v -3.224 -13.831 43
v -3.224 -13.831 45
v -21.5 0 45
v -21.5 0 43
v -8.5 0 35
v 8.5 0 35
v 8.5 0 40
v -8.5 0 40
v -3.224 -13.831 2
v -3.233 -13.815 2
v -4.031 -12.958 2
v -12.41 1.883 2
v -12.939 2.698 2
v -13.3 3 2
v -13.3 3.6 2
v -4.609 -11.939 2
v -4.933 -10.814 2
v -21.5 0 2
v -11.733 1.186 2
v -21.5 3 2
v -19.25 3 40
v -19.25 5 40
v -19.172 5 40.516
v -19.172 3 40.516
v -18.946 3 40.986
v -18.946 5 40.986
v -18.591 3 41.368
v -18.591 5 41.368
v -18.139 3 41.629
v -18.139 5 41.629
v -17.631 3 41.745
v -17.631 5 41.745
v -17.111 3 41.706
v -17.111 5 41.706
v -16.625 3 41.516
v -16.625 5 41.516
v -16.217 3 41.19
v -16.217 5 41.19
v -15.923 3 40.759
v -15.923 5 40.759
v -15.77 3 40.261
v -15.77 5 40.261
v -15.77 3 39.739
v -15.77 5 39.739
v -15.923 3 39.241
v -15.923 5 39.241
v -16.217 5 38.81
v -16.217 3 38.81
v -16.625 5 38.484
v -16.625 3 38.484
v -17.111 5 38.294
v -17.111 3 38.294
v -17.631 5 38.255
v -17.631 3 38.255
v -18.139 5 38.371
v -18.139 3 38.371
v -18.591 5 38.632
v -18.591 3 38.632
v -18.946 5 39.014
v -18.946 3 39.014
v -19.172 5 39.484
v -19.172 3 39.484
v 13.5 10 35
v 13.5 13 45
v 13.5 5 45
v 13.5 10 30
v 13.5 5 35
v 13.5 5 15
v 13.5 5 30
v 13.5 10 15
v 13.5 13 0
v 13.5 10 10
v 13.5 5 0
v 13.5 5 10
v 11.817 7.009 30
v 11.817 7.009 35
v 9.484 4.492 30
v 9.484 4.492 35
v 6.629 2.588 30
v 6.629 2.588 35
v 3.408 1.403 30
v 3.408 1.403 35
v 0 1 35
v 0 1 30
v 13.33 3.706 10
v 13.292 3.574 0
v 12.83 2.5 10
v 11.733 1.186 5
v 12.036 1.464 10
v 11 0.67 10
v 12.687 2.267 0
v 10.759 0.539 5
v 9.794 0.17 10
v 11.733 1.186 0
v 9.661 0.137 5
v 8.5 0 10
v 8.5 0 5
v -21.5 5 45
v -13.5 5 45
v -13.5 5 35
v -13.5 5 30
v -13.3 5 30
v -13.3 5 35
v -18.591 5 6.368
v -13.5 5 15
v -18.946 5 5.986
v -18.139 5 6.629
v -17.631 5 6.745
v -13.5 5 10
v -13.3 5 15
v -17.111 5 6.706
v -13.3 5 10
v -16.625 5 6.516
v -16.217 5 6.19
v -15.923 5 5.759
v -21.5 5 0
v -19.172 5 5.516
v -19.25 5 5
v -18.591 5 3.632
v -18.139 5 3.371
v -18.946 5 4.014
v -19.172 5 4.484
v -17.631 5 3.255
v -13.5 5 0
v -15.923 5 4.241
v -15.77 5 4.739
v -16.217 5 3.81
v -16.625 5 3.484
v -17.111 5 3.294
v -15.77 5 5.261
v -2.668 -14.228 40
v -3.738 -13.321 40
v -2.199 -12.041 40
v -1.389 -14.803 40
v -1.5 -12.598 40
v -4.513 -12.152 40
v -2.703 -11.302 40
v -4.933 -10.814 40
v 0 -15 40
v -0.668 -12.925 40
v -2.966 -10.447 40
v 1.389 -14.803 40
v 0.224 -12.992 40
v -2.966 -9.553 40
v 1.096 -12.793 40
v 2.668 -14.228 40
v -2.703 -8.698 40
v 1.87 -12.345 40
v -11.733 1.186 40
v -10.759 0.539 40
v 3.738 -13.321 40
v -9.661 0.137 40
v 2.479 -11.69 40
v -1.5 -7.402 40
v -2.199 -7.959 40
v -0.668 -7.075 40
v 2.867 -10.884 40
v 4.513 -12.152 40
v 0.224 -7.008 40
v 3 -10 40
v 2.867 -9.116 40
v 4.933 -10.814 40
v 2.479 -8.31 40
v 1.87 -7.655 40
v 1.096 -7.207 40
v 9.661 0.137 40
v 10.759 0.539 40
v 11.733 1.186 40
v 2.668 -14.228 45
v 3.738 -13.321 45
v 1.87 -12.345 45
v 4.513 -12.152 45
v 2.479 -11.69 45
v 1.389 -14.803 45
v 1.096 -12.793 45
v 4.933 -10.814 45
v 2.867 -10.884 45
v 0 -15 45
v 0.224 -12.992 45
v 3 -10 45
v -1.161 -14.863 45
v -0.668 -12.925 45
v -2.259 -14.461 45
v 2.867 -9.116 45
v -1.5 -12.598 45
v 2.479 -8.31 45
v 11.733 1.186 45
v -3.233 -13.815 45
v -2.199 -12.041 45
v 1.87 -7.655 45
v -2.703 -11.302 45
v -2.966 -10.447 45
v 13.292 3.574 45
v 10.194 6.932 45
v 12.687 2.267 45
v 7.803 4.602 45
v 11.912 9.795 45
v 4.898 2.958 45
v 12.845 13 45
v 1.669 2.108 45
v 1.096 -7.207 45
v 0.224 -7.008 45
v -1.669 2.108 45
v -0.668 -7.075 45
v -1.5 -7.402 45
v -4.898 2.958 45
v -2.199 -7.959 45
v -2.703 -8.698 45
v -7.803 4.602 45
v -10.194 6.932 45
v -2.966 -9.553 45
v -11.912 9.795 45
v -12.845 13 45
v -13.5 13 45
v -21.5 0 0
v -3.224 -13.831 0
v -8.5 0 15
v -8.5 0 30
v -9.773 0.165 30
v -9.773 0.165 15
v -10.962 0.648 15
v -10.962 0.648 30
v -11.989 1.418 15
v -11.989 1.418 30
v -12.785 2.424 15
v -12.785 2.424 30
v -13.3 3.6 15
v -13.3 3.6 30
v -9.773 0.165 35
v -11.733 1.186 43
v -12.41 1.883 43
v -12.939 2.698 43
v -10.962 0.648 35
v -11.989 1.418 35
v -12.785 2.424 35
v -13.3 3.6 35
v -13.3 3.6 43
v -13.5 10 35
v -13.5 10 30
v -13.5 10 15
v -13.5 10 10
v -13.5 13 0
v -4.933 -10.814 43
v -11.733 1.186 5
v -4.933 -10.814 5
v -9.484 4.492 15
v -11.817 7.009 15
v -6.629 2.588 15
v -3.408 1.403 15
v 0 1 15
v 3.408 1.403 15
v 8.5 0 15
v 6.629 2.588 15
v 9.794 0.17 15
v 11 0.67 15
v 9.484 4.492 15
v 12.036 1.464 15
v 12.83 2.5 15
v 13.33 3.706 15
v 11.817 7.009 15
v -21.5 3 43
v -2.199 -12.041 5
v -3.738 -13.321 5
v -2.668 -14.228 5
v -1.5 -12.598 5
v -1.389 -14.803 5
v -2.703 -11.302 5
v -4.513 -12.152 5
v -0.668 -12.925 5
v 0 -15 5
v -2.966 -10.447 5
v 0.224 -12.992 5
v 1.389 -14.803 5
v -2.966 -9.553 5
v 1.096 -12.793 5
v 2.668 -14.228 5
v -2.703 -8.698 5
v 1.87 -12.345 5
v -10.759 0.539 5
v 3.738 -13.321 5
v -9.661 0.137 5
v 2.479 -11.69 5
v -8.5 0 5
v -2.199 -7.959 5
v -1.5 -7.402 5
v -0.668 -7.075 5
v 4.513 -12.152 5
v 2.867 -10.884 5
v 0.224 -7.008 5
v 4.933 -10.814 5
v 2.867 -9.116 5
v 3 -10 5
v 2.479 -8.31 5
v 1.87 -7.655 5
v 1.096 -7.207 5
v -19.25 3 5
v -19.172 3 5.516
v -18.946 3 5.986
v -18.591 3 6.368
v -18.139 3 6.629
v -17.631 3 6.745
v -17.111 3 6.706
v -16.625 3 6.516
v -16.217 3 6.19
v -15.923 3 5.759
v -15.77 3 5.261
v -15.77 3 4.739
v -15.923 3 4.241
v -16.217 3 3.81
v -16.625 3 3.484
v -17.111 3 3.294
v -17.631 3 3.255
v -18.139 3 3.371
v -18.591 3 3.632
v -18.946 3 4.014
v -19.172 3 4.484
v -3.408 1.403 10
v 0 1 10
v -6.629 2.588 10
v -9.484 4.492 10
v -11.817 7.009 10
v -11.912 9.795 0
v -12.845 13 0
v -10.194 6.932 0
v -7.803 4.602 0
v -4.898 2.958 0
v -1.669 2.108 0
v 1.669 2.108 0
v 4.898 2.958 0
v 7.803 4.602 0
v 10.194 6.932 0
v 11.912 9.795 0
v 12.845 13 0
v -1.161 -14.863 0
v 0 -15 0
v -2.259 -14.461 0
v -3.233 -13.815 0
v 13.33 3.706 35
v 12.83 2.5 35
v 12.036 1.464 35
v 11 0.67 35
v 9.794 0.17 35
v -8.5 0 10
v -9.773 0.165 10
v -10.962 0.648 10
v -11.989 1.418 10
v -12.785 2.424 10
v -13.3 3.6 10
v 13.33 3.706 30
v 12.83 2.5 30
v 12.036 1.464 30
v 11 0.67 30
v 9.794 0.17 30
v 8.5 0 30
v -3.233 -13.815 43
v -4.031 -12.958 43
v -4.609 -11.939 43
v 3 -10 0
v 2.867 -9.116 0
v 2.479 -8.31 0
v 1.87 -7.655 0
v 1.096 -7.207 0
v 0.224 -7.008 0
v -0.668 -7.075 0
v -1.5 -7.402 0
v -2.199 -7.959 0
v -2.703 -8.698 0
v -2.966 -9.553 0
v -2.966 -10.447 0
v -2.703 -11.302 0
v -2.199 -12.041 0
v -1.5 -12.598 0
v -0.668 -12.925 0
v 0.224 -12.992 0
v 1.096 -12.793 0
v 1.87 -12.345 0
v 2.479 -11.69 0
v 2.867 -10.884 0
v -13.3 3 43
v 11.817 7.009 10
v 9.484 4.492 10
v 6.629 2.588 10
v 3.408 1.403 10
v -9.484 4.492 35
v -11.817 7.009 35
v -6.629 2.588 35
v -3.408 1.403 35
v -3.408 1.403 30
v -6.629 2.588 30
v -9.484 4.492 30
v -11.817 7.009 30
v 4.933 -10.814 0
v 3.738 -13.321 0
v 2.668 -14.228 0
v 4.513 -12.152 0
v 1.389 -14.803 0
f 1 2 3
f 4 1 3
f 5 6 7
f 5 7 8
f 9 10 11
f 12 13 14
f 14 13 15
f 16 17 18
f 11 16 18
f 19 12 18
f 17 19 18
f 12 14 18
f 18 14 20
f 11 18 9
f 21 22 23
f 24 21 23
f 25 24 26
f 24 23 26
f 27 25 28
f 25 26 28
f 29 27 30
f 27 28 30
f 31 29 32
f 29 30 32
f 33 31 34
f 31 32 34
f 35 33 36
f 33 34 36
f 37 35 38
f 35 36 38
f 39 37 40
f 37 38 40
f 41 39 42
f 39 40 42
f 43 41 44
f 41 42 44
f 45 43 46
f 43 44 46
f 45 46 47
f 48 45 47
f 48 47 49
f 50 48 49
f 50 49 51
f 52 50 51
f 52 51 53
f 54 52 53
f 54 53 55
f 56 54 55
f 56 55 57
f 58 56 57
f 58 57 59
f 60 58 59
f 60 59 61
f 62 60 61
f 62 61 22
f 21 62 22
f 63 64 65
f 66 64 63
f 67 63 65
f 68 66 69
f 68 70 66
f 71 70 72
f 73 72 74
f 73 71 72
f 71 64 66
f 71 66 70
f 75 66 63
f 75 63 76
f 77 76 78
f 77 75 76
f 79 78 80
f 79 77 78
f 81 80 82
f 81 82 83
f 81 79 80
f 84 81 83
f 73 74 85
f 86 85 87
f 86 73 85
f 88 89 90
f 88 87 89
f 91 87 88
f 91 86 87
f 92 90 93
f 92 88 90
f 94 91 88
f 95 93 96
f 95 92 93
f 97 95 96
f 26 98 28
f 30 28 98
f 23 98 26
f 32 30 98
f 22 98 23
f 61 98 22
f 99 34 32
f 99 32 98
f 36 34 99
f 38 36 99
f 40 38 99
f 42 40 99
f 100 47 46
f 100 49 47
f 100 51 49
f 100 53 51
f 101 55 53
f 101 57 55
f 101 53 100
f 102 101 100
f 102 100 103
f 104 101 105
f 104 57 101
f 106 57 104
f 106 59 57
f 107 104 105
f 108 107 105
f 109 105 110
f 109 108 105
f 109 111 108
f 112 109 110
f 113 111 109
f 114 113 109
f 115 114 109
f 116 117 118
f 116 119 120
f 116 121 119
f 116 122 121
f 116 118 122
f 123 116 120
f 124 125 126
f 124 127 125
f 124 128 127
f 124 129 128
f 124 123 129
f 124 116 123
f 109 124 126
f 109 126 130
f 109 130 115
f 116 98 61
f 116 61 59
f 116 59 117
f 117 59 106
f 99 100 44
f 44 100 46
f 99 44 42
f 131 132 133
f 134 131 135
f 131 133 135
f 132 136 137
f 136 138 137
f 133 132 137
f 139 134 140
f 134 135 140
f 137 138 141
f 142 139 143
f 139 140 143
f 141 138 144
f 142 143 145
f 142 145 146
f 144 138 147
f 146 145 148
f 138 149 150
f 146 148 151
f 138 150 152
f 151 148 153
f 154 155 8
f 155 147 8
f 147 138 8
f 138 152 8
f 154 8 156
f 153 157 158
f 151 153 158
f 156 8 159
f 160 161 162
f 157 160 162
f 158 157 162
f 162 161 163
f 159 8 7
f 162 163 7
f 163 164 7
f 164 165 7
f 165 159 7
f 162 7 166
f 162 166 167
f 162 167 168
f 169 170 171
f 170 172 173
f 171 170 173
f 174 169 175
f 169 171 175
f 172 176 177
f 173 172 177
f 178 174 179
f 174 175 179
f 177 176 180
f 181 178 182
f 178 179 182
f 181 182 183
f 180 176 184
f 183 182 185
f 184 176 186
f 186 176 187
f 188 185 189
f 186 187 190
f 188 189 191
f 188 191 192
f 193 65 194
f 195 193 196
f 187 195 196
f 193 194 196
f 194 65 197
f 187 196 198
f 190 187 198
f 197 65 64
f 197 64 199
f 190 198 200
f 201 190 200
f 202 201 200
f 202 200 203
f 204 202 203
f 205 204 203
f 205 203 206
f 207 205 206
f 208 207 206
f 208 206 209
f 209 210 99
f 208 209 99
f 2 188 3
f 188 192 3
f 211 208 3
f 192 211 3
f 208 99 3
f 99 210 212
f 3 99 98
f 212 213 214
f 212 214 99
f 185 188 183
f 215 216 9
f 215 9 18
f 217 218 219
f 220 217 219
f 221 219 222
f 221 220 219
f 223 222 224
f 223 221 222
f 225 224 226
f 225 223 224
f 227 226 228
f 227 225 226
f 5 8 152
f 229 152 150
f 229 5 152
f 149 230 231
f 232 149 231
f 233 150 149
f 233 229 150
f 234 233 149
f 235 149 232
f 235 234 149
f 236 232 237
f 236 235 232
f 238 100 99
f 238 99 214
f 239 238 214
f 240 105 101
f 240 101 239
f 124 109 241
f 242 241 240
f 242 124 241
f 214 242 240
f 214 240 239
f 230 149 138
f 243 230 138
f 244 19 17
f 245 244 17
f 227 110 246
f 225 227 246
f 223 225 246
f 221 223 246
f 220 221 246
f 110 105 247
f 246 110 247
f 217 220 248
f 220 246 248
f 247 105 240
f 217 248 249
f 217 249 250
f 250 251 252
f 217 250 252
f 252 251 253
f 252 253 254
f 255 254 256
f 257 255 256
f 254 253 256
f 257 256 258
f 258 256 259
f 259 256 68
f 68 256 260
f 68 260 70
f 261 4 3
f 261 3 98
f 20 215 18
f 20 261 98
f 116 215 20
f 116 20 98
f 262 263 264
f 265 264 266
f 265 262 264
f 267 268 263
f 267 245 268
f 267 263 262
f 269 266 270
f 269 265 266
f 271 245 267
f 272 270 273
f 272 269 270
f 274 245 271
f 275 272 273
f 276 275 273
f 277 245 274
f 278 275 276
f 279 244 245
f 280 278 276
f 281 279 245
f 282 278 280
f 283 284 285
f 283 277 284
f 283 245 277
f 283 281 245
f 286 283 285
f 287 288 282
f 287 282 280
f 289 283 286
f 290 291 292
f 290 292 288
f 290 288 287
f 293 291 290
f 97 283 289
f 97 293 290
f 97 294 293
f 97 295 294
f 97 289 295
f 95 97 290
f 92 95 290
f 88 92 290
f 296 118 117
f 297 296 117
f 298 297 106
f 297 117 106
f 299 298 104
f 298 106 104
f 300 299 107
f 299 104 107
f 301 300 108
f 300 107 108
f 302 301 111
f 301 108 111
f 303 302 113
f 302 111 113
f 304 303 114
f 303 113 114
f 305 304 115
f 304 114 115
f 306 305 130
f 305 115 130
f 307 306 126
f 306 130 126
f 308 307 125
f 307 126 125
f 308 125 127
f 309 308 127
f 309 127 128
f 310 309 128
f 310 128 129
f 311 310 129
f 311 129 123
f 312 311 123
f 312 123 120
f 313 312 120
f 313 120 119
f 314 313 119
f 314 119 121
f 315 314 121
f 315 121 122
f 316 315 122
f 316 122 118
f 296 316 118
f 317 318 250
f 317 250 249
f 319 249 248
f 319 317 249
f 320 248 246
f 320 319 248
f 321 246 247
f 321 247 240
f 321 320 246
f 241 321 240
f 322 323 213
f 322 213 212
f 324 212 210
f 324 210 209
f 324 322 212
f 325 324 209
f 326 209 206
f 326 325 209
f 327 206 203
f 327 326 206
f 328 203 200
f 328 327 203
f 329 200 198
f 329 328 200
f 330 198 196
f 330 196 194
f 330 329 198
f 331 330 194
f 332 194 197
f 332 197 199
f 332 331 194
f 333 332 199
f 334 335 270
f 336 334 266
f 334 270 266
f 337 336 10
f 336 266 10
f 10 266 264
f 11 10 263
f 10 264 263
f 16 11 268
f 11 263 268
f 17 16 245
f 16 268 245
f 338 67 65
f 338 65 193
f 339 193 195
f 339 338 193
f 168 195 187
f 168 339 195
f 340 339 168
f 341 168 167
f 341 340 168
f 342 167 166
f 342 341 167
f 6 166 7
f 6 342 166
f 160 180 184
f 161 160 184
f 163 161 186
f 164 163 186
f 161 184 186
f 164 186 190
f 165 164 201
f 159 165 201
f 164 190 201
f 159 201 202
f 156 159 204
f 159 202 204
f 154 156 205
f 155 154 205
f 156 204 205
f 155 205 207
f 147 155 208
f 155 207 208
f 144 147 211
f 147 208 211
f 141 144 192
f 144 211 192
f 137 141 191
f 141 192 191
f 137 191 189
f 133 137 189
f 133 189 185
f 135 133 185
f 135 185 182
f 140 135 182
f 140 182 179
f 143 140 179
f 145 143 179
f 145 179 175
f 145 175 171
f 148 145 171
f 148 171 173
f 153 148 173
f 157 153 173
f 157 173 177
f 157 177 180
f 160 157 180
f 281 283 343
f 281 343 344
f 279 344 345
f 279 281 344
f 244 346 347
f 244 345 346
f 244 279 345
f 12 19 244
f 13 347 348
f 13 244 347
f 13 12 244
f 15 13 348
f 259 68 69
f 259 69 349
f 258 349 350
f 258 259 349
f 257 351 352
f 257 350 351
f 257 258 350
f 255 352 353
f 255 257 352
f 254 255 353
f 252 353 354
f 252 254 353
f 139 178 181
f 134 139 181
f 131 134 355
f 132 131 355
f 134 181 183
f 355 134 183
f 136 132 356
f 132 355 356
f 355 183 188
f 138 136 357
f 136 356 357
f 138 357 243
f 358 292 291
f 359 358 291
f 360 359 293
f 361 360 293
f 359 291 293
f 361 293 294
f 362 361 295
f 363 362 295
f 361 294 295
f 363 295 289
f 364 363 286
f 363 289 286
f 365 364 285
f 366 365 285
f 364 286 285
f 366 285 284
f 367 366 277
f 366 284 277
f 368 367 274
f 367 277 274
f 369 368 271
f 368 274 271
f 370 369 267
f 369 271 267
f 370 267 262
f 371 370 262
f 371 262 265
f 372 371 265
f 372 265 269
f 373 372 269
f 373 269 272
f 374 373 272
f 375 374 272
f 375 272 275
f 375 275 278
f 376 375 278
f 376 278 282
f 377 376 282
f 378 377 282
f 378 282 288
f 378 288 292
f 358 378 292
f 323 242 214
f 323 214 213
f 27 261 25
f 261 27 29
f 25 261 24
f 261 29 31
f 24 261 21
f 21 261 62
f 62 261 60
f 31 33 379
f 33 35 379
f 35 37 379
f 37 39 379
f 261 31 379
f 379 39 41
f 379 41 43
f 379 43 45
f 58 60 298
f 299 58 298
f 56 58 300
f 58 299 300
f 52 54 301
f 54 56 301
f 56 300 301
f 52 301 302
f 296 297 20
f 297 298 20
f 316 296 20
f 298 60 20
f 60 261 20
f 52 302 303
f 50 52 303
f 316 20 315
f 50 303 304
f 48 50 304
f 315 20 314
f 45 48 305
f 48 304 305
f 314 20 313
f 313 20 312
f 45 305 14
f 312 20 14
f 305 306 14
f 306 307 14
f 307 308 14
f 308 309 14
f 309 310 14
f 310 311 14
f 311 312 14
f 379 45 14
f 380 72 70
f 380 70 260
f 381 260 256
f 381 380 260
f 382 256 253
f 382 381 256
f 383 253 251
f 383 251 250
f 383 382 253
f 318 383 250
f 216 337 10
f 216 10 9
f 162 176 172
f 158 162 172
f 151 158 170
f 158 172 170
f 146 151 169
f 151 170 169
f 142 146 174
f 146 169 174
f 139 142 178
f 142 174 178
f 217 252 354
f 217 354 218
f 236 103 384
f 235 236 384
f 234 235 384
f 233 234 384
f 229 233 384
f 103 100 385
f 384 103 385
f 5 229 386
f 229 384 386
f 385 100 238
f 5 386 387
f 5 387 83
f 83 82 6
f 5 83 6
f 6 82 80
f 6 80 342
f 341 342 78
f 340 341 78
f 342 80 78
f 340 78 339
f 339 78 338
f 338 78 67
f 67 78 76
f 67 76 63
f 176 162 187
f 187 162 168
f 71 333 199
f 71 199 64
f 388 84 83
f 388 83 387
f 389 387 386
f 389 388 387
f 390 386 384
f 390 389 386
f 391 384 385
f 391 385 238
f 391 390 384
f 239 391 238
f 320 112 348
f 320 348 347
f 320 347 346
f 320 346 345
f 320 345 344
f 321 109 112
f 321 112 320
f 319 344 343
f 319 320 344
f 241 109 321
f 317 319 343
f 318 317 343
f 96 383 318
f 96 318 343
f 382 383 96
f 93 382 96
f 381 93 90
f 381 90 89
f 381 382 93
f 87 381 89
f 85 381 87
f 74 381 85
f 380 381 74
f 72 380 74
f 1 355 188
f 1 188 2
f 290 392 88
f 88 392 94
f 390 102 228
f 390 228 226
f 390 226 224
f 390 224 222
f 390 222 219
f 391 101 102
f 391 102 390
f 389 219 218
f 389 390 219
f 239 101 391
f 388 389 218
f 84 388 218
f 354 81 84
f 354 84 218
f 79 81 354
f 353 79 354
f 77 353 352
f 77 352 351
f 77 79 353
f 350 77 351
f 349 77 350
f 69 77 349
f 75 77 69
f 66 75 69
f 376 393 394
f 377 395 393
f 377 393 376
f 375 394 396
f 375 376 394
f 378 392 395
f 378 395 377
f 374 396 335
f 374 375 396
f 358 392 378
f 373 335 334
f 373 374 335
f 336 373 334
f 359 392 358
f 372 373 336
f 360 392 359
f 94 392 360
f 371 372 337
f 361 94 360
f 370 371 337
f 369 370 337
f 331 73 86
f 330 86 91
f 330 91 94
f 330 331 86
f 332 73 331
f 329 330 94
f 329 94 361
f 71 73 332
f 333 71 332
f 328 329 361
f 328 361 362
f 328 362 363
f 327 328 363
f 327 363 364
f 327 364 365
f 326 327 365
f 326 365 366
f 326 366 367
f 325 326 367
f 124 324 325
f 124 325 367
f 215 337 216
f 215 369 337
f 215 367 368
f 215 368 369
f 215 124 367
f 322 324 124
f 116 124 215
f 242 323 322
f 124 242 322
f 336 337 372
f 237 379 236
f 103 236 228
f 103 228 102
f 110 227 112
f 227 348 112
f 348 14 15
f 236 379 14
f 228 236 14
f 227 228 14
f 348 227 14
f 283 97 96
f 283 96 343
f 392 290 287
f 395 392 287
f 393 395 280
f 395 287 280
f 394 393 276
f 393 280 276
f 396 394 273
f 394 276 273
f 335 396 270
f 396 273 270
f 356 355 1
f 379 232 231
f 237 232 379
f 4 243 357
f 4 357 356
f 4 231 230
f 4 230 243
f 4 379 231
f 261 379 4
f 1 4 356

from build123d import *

# Parameters (mm, degrees)
BOSS_EXTRUDE1_DEPTH = 45
SKETCH2_W           = 10
SKETCH2_H           = 5
BOSS_EXTRUDE2_DEPTH = 15
SKETCH3_R           = 3
CUT_EXTRUDE1_DEPTH  = 50.317846668
FILLET1_R           = 5
CUT_EXTRUDE2_DEPTH  = 5
LPATTERN1_COUNT     = 2
LPATTERN1_PITCH     = 20
CHAMFER1_DEPTH      = 5
CHAMFER1_START      = 40
CHAMFER1_2_DEPTH    = 5
BOSS_EXTRUDE3_DEPTH = 2
BOSS_EXTRUDE9_REACH = 52.361
SKETCH8_W           = 8.2
SKETCH8_H           = 2
SKETCH9_R           = 1.75
CUT_EXTRUDE4_DEPTH  = 47


with BuildPart() as part:
    # Sketch1 → Boss-Extrude1 (new body)
    with BuildSketch(Plane.XY):
        with BuildLine():
            Line((12.845232579, 13), (13.5, 13))
            Line((13.5, 13), (13.5, 5))
            ThreePointArc((13.5, 5), (12.035533906, 1.464466094), (8.5, 0))
            Line((8.5, 0), (-8.5, 0))
            ThreePointArc((-8.5, 0), (-12.035533906, 1.464466094), (-13.5, 5))
            Line((-13.5, 5), (-13.5, 13))
            Line((-13.5, 13), (-12.845232579, 13))
            ThreePointArc((-12.845232579, 13), (0, 2), (12.845232579, 13))
        make_face()
    extrude(amount=BOSS_EXTRUDE1_DEPTH)

    # Sketch2 → Boss-Extrude2 (add)
    with BuildSketch(Plane.XZ):
        with Locations((0, 42.5)):
            Rectangle(SKETCH2_W, SKETCH2_H)
        with Locations((0, 2.5)):
            Rectangle(SKETCH2_W, SKETCH2_H)
    extrude(amount=BOSS_EXTRUDE2_DEPTH)

    # Sketch3 → Cut-Extrude1 (cut, through all)
    with BuildSketch(Plane.XY.offset(45)):
        with Locations((0, -10)):
            Circle(SKETCH3_R)
    extrude(amount=-CUT_EXTRUDE1_DEPTH, mode=Mode.SUBTRACT)

    # Fillet1
    fillet1_edges = [part.edges().sort_by_distance(p)[0] for p in [
        (-5, -15, 2.5),
        (-5, -15, 42.5),
        (5, -15, 42.5),
        (5, -15, 2.5),
    ]]
    fillet(fillet1_edges, radius=FILLET1_R - 0.0001)  # a hair under: the kernel refuses the full size

    # Sketch4 → Cut-Extrude2 (cut)
    with BuildSketch(Plane.XY.offset(10)):
        with BuildLine():
            Line((-13.5, 10), (-13.5, 5))
            ThreePointArc((-13.5, 5), (-12.035533906, 1.464466094), (-8.5, 0))
            Line((-8.5, 0), (5, 0))
            Line((5, 0), (8.5, 0))
            ThreePointArc((8.5, 0), (12.035533906, 1.464466094), (13.5, 5))
            Line((13.5, 5), (13.5, 10))
            ThreePointArc((13.5, 10), (8.11249037, 3.456264445), (0, 1))
            ThreePointArc((0, 1), (-8.11249037, 3.456264445), (-13.5, 10))
        make_face()
    cut_extrude2 = extrude(amount=CUT_EXTRUDE2_DEPTH, mode=Mode.SUBTRACT)

    # LPattern1: Cut-Extrude2 ×2
    with Locations(*[(0, 0, i * LPATTERN1_PITCH) for i in range(1, LPATTERN1_COUNT)]):
        add(cut_extrude2, mode=Mode.SUBTRACT)

    # Chamfer1: read off the stored shape, not the designer's step
    # Chamfer1 outline → Chamfer1 (add)
    with BuildSketch(Plane.XY):
        with BuildLine():
            ThreePointArc((5, -10), (4.983300978, -10.408303031), (4.933315454, -10.813878757))
            Line((4.933315454, -10.813878757), (11.733315454, 1.186121243))
            ThreePointArc((11.733315454, 1.186121243), (10.222005548, 0.305886996), (8.5, 0))
            Line((8.5, 0), (5, 0))
            Line((5, 0), (5, -10))
        make_face()
        with BuildLine():
            Line((-11.733315454, 1.186121243), (-4.933315454, -10.813878757))
            ThreePointArc((-4.933315454, -10.813878757), (-4.983300978, -10.408303031), (-5, -10))
            Line((-5, -10), (-5, 0))
            Line((-5, 0), (-8.5, 0))
            ThreePointArc((-8.5, 0), (-10.222005548, 0.305886996), (-11.733315454, 1.186121243))
        make_face()
    extrude(amount=CHAMFER1_DEPTH)

    # Chamfer1 2 outline → Chamfer1 2 (add)
    with BuildSketch(Plane.XY.offset(CHAMFER1_START)):
        with BuildLine():
            ThreePointArc((5, -10), (4.983300978, -10.408303031), (4.933315454, -10.813878757))
            Line((4.933315454, -10.813878757), (11.733315454, 1.186121243))
            ThreePointArc((11.733315454, 1.186121243), (10.222005548, 0.305886996), (8.5, 0))
            Line((8.5, 0), (5, 0))
            Line((5, 0), (5, -10))
        make_face()
        with BuildLine():
            Line((-11.733315454, 1.186121243), (-4.933315454, -10.813878757))
            ThreePointArc((-4.933315454, -10.813878757), (-4.983300978, -10.408303031), (-5, -10))
            Line((-5, -10), (-5, 0))
            Line((-5, 0), (-8.5, 0))
            ThreePointArc((-8.5, 0), (-10.222005548, 0.305886996), (-11.733315454, 1.186121243))
        make_face()
    extrude(amount=CHAMFER1_2_DEPTH)

    # Sketch6 → Boss-Extrude3 (add)
    with BuildSketch(Plane(origin=(0, 0, 0), x_dir=(-1, 0, 0), z_dir=(0, 0, -1))):
        Polygon((3.223775495, -13.830713979), (21.5, 0), (21.5, 5), (13.5, 5), align=None)
    boss_extrude3 = extrude(amount=-BOSS_EXTRUDE3_DEPTH)

    # Mirror1: Boss-Extrude3 across plane
    add(boss_extrude3.mirror(Plane.XY.offset(22.5)))

    # Sketch8 → Boss-Extrude9 (add, up to next)
    with BuildSketch(Plane.XY.offset(2), mode=Mode.PRIVATE) as boss_extrude9_sk1:
        with Locations((-17.4, 4)):
            Rectangle(SKETCH8_W, SKETCH8_H)
    boss_extrude9_tool1 = extrude(boss_extrude9_sk1.sketch, amount=BOSS_EXTRUDE9_REACH, mode=Mode.PRIVATE) - part.part
    add(boss_extrude9_tool1.solids().sort_by_distance((-17.4, 4, 2))[0])

    # Sketch9 → Cut-Extrude4 (cut)
    with BuildSketch(Plane(origin=(0, 5, 0), x_dir=(1, 0, 0), z_dir=(0, 1, 0))):
        with Locations(Location((-17.5, -5, 0), (0, 0, 180))):
            Circle(SKETCH9_R)
        with Locations(Location((-17.5, -40, 0), (0, 0, 180))):
            Circle(SKETCH9_R)
    extrude(amount=-CUT_EXTRUDE4_DEPTH, mode=Mode.SUBTRACT)


solid = part.part
